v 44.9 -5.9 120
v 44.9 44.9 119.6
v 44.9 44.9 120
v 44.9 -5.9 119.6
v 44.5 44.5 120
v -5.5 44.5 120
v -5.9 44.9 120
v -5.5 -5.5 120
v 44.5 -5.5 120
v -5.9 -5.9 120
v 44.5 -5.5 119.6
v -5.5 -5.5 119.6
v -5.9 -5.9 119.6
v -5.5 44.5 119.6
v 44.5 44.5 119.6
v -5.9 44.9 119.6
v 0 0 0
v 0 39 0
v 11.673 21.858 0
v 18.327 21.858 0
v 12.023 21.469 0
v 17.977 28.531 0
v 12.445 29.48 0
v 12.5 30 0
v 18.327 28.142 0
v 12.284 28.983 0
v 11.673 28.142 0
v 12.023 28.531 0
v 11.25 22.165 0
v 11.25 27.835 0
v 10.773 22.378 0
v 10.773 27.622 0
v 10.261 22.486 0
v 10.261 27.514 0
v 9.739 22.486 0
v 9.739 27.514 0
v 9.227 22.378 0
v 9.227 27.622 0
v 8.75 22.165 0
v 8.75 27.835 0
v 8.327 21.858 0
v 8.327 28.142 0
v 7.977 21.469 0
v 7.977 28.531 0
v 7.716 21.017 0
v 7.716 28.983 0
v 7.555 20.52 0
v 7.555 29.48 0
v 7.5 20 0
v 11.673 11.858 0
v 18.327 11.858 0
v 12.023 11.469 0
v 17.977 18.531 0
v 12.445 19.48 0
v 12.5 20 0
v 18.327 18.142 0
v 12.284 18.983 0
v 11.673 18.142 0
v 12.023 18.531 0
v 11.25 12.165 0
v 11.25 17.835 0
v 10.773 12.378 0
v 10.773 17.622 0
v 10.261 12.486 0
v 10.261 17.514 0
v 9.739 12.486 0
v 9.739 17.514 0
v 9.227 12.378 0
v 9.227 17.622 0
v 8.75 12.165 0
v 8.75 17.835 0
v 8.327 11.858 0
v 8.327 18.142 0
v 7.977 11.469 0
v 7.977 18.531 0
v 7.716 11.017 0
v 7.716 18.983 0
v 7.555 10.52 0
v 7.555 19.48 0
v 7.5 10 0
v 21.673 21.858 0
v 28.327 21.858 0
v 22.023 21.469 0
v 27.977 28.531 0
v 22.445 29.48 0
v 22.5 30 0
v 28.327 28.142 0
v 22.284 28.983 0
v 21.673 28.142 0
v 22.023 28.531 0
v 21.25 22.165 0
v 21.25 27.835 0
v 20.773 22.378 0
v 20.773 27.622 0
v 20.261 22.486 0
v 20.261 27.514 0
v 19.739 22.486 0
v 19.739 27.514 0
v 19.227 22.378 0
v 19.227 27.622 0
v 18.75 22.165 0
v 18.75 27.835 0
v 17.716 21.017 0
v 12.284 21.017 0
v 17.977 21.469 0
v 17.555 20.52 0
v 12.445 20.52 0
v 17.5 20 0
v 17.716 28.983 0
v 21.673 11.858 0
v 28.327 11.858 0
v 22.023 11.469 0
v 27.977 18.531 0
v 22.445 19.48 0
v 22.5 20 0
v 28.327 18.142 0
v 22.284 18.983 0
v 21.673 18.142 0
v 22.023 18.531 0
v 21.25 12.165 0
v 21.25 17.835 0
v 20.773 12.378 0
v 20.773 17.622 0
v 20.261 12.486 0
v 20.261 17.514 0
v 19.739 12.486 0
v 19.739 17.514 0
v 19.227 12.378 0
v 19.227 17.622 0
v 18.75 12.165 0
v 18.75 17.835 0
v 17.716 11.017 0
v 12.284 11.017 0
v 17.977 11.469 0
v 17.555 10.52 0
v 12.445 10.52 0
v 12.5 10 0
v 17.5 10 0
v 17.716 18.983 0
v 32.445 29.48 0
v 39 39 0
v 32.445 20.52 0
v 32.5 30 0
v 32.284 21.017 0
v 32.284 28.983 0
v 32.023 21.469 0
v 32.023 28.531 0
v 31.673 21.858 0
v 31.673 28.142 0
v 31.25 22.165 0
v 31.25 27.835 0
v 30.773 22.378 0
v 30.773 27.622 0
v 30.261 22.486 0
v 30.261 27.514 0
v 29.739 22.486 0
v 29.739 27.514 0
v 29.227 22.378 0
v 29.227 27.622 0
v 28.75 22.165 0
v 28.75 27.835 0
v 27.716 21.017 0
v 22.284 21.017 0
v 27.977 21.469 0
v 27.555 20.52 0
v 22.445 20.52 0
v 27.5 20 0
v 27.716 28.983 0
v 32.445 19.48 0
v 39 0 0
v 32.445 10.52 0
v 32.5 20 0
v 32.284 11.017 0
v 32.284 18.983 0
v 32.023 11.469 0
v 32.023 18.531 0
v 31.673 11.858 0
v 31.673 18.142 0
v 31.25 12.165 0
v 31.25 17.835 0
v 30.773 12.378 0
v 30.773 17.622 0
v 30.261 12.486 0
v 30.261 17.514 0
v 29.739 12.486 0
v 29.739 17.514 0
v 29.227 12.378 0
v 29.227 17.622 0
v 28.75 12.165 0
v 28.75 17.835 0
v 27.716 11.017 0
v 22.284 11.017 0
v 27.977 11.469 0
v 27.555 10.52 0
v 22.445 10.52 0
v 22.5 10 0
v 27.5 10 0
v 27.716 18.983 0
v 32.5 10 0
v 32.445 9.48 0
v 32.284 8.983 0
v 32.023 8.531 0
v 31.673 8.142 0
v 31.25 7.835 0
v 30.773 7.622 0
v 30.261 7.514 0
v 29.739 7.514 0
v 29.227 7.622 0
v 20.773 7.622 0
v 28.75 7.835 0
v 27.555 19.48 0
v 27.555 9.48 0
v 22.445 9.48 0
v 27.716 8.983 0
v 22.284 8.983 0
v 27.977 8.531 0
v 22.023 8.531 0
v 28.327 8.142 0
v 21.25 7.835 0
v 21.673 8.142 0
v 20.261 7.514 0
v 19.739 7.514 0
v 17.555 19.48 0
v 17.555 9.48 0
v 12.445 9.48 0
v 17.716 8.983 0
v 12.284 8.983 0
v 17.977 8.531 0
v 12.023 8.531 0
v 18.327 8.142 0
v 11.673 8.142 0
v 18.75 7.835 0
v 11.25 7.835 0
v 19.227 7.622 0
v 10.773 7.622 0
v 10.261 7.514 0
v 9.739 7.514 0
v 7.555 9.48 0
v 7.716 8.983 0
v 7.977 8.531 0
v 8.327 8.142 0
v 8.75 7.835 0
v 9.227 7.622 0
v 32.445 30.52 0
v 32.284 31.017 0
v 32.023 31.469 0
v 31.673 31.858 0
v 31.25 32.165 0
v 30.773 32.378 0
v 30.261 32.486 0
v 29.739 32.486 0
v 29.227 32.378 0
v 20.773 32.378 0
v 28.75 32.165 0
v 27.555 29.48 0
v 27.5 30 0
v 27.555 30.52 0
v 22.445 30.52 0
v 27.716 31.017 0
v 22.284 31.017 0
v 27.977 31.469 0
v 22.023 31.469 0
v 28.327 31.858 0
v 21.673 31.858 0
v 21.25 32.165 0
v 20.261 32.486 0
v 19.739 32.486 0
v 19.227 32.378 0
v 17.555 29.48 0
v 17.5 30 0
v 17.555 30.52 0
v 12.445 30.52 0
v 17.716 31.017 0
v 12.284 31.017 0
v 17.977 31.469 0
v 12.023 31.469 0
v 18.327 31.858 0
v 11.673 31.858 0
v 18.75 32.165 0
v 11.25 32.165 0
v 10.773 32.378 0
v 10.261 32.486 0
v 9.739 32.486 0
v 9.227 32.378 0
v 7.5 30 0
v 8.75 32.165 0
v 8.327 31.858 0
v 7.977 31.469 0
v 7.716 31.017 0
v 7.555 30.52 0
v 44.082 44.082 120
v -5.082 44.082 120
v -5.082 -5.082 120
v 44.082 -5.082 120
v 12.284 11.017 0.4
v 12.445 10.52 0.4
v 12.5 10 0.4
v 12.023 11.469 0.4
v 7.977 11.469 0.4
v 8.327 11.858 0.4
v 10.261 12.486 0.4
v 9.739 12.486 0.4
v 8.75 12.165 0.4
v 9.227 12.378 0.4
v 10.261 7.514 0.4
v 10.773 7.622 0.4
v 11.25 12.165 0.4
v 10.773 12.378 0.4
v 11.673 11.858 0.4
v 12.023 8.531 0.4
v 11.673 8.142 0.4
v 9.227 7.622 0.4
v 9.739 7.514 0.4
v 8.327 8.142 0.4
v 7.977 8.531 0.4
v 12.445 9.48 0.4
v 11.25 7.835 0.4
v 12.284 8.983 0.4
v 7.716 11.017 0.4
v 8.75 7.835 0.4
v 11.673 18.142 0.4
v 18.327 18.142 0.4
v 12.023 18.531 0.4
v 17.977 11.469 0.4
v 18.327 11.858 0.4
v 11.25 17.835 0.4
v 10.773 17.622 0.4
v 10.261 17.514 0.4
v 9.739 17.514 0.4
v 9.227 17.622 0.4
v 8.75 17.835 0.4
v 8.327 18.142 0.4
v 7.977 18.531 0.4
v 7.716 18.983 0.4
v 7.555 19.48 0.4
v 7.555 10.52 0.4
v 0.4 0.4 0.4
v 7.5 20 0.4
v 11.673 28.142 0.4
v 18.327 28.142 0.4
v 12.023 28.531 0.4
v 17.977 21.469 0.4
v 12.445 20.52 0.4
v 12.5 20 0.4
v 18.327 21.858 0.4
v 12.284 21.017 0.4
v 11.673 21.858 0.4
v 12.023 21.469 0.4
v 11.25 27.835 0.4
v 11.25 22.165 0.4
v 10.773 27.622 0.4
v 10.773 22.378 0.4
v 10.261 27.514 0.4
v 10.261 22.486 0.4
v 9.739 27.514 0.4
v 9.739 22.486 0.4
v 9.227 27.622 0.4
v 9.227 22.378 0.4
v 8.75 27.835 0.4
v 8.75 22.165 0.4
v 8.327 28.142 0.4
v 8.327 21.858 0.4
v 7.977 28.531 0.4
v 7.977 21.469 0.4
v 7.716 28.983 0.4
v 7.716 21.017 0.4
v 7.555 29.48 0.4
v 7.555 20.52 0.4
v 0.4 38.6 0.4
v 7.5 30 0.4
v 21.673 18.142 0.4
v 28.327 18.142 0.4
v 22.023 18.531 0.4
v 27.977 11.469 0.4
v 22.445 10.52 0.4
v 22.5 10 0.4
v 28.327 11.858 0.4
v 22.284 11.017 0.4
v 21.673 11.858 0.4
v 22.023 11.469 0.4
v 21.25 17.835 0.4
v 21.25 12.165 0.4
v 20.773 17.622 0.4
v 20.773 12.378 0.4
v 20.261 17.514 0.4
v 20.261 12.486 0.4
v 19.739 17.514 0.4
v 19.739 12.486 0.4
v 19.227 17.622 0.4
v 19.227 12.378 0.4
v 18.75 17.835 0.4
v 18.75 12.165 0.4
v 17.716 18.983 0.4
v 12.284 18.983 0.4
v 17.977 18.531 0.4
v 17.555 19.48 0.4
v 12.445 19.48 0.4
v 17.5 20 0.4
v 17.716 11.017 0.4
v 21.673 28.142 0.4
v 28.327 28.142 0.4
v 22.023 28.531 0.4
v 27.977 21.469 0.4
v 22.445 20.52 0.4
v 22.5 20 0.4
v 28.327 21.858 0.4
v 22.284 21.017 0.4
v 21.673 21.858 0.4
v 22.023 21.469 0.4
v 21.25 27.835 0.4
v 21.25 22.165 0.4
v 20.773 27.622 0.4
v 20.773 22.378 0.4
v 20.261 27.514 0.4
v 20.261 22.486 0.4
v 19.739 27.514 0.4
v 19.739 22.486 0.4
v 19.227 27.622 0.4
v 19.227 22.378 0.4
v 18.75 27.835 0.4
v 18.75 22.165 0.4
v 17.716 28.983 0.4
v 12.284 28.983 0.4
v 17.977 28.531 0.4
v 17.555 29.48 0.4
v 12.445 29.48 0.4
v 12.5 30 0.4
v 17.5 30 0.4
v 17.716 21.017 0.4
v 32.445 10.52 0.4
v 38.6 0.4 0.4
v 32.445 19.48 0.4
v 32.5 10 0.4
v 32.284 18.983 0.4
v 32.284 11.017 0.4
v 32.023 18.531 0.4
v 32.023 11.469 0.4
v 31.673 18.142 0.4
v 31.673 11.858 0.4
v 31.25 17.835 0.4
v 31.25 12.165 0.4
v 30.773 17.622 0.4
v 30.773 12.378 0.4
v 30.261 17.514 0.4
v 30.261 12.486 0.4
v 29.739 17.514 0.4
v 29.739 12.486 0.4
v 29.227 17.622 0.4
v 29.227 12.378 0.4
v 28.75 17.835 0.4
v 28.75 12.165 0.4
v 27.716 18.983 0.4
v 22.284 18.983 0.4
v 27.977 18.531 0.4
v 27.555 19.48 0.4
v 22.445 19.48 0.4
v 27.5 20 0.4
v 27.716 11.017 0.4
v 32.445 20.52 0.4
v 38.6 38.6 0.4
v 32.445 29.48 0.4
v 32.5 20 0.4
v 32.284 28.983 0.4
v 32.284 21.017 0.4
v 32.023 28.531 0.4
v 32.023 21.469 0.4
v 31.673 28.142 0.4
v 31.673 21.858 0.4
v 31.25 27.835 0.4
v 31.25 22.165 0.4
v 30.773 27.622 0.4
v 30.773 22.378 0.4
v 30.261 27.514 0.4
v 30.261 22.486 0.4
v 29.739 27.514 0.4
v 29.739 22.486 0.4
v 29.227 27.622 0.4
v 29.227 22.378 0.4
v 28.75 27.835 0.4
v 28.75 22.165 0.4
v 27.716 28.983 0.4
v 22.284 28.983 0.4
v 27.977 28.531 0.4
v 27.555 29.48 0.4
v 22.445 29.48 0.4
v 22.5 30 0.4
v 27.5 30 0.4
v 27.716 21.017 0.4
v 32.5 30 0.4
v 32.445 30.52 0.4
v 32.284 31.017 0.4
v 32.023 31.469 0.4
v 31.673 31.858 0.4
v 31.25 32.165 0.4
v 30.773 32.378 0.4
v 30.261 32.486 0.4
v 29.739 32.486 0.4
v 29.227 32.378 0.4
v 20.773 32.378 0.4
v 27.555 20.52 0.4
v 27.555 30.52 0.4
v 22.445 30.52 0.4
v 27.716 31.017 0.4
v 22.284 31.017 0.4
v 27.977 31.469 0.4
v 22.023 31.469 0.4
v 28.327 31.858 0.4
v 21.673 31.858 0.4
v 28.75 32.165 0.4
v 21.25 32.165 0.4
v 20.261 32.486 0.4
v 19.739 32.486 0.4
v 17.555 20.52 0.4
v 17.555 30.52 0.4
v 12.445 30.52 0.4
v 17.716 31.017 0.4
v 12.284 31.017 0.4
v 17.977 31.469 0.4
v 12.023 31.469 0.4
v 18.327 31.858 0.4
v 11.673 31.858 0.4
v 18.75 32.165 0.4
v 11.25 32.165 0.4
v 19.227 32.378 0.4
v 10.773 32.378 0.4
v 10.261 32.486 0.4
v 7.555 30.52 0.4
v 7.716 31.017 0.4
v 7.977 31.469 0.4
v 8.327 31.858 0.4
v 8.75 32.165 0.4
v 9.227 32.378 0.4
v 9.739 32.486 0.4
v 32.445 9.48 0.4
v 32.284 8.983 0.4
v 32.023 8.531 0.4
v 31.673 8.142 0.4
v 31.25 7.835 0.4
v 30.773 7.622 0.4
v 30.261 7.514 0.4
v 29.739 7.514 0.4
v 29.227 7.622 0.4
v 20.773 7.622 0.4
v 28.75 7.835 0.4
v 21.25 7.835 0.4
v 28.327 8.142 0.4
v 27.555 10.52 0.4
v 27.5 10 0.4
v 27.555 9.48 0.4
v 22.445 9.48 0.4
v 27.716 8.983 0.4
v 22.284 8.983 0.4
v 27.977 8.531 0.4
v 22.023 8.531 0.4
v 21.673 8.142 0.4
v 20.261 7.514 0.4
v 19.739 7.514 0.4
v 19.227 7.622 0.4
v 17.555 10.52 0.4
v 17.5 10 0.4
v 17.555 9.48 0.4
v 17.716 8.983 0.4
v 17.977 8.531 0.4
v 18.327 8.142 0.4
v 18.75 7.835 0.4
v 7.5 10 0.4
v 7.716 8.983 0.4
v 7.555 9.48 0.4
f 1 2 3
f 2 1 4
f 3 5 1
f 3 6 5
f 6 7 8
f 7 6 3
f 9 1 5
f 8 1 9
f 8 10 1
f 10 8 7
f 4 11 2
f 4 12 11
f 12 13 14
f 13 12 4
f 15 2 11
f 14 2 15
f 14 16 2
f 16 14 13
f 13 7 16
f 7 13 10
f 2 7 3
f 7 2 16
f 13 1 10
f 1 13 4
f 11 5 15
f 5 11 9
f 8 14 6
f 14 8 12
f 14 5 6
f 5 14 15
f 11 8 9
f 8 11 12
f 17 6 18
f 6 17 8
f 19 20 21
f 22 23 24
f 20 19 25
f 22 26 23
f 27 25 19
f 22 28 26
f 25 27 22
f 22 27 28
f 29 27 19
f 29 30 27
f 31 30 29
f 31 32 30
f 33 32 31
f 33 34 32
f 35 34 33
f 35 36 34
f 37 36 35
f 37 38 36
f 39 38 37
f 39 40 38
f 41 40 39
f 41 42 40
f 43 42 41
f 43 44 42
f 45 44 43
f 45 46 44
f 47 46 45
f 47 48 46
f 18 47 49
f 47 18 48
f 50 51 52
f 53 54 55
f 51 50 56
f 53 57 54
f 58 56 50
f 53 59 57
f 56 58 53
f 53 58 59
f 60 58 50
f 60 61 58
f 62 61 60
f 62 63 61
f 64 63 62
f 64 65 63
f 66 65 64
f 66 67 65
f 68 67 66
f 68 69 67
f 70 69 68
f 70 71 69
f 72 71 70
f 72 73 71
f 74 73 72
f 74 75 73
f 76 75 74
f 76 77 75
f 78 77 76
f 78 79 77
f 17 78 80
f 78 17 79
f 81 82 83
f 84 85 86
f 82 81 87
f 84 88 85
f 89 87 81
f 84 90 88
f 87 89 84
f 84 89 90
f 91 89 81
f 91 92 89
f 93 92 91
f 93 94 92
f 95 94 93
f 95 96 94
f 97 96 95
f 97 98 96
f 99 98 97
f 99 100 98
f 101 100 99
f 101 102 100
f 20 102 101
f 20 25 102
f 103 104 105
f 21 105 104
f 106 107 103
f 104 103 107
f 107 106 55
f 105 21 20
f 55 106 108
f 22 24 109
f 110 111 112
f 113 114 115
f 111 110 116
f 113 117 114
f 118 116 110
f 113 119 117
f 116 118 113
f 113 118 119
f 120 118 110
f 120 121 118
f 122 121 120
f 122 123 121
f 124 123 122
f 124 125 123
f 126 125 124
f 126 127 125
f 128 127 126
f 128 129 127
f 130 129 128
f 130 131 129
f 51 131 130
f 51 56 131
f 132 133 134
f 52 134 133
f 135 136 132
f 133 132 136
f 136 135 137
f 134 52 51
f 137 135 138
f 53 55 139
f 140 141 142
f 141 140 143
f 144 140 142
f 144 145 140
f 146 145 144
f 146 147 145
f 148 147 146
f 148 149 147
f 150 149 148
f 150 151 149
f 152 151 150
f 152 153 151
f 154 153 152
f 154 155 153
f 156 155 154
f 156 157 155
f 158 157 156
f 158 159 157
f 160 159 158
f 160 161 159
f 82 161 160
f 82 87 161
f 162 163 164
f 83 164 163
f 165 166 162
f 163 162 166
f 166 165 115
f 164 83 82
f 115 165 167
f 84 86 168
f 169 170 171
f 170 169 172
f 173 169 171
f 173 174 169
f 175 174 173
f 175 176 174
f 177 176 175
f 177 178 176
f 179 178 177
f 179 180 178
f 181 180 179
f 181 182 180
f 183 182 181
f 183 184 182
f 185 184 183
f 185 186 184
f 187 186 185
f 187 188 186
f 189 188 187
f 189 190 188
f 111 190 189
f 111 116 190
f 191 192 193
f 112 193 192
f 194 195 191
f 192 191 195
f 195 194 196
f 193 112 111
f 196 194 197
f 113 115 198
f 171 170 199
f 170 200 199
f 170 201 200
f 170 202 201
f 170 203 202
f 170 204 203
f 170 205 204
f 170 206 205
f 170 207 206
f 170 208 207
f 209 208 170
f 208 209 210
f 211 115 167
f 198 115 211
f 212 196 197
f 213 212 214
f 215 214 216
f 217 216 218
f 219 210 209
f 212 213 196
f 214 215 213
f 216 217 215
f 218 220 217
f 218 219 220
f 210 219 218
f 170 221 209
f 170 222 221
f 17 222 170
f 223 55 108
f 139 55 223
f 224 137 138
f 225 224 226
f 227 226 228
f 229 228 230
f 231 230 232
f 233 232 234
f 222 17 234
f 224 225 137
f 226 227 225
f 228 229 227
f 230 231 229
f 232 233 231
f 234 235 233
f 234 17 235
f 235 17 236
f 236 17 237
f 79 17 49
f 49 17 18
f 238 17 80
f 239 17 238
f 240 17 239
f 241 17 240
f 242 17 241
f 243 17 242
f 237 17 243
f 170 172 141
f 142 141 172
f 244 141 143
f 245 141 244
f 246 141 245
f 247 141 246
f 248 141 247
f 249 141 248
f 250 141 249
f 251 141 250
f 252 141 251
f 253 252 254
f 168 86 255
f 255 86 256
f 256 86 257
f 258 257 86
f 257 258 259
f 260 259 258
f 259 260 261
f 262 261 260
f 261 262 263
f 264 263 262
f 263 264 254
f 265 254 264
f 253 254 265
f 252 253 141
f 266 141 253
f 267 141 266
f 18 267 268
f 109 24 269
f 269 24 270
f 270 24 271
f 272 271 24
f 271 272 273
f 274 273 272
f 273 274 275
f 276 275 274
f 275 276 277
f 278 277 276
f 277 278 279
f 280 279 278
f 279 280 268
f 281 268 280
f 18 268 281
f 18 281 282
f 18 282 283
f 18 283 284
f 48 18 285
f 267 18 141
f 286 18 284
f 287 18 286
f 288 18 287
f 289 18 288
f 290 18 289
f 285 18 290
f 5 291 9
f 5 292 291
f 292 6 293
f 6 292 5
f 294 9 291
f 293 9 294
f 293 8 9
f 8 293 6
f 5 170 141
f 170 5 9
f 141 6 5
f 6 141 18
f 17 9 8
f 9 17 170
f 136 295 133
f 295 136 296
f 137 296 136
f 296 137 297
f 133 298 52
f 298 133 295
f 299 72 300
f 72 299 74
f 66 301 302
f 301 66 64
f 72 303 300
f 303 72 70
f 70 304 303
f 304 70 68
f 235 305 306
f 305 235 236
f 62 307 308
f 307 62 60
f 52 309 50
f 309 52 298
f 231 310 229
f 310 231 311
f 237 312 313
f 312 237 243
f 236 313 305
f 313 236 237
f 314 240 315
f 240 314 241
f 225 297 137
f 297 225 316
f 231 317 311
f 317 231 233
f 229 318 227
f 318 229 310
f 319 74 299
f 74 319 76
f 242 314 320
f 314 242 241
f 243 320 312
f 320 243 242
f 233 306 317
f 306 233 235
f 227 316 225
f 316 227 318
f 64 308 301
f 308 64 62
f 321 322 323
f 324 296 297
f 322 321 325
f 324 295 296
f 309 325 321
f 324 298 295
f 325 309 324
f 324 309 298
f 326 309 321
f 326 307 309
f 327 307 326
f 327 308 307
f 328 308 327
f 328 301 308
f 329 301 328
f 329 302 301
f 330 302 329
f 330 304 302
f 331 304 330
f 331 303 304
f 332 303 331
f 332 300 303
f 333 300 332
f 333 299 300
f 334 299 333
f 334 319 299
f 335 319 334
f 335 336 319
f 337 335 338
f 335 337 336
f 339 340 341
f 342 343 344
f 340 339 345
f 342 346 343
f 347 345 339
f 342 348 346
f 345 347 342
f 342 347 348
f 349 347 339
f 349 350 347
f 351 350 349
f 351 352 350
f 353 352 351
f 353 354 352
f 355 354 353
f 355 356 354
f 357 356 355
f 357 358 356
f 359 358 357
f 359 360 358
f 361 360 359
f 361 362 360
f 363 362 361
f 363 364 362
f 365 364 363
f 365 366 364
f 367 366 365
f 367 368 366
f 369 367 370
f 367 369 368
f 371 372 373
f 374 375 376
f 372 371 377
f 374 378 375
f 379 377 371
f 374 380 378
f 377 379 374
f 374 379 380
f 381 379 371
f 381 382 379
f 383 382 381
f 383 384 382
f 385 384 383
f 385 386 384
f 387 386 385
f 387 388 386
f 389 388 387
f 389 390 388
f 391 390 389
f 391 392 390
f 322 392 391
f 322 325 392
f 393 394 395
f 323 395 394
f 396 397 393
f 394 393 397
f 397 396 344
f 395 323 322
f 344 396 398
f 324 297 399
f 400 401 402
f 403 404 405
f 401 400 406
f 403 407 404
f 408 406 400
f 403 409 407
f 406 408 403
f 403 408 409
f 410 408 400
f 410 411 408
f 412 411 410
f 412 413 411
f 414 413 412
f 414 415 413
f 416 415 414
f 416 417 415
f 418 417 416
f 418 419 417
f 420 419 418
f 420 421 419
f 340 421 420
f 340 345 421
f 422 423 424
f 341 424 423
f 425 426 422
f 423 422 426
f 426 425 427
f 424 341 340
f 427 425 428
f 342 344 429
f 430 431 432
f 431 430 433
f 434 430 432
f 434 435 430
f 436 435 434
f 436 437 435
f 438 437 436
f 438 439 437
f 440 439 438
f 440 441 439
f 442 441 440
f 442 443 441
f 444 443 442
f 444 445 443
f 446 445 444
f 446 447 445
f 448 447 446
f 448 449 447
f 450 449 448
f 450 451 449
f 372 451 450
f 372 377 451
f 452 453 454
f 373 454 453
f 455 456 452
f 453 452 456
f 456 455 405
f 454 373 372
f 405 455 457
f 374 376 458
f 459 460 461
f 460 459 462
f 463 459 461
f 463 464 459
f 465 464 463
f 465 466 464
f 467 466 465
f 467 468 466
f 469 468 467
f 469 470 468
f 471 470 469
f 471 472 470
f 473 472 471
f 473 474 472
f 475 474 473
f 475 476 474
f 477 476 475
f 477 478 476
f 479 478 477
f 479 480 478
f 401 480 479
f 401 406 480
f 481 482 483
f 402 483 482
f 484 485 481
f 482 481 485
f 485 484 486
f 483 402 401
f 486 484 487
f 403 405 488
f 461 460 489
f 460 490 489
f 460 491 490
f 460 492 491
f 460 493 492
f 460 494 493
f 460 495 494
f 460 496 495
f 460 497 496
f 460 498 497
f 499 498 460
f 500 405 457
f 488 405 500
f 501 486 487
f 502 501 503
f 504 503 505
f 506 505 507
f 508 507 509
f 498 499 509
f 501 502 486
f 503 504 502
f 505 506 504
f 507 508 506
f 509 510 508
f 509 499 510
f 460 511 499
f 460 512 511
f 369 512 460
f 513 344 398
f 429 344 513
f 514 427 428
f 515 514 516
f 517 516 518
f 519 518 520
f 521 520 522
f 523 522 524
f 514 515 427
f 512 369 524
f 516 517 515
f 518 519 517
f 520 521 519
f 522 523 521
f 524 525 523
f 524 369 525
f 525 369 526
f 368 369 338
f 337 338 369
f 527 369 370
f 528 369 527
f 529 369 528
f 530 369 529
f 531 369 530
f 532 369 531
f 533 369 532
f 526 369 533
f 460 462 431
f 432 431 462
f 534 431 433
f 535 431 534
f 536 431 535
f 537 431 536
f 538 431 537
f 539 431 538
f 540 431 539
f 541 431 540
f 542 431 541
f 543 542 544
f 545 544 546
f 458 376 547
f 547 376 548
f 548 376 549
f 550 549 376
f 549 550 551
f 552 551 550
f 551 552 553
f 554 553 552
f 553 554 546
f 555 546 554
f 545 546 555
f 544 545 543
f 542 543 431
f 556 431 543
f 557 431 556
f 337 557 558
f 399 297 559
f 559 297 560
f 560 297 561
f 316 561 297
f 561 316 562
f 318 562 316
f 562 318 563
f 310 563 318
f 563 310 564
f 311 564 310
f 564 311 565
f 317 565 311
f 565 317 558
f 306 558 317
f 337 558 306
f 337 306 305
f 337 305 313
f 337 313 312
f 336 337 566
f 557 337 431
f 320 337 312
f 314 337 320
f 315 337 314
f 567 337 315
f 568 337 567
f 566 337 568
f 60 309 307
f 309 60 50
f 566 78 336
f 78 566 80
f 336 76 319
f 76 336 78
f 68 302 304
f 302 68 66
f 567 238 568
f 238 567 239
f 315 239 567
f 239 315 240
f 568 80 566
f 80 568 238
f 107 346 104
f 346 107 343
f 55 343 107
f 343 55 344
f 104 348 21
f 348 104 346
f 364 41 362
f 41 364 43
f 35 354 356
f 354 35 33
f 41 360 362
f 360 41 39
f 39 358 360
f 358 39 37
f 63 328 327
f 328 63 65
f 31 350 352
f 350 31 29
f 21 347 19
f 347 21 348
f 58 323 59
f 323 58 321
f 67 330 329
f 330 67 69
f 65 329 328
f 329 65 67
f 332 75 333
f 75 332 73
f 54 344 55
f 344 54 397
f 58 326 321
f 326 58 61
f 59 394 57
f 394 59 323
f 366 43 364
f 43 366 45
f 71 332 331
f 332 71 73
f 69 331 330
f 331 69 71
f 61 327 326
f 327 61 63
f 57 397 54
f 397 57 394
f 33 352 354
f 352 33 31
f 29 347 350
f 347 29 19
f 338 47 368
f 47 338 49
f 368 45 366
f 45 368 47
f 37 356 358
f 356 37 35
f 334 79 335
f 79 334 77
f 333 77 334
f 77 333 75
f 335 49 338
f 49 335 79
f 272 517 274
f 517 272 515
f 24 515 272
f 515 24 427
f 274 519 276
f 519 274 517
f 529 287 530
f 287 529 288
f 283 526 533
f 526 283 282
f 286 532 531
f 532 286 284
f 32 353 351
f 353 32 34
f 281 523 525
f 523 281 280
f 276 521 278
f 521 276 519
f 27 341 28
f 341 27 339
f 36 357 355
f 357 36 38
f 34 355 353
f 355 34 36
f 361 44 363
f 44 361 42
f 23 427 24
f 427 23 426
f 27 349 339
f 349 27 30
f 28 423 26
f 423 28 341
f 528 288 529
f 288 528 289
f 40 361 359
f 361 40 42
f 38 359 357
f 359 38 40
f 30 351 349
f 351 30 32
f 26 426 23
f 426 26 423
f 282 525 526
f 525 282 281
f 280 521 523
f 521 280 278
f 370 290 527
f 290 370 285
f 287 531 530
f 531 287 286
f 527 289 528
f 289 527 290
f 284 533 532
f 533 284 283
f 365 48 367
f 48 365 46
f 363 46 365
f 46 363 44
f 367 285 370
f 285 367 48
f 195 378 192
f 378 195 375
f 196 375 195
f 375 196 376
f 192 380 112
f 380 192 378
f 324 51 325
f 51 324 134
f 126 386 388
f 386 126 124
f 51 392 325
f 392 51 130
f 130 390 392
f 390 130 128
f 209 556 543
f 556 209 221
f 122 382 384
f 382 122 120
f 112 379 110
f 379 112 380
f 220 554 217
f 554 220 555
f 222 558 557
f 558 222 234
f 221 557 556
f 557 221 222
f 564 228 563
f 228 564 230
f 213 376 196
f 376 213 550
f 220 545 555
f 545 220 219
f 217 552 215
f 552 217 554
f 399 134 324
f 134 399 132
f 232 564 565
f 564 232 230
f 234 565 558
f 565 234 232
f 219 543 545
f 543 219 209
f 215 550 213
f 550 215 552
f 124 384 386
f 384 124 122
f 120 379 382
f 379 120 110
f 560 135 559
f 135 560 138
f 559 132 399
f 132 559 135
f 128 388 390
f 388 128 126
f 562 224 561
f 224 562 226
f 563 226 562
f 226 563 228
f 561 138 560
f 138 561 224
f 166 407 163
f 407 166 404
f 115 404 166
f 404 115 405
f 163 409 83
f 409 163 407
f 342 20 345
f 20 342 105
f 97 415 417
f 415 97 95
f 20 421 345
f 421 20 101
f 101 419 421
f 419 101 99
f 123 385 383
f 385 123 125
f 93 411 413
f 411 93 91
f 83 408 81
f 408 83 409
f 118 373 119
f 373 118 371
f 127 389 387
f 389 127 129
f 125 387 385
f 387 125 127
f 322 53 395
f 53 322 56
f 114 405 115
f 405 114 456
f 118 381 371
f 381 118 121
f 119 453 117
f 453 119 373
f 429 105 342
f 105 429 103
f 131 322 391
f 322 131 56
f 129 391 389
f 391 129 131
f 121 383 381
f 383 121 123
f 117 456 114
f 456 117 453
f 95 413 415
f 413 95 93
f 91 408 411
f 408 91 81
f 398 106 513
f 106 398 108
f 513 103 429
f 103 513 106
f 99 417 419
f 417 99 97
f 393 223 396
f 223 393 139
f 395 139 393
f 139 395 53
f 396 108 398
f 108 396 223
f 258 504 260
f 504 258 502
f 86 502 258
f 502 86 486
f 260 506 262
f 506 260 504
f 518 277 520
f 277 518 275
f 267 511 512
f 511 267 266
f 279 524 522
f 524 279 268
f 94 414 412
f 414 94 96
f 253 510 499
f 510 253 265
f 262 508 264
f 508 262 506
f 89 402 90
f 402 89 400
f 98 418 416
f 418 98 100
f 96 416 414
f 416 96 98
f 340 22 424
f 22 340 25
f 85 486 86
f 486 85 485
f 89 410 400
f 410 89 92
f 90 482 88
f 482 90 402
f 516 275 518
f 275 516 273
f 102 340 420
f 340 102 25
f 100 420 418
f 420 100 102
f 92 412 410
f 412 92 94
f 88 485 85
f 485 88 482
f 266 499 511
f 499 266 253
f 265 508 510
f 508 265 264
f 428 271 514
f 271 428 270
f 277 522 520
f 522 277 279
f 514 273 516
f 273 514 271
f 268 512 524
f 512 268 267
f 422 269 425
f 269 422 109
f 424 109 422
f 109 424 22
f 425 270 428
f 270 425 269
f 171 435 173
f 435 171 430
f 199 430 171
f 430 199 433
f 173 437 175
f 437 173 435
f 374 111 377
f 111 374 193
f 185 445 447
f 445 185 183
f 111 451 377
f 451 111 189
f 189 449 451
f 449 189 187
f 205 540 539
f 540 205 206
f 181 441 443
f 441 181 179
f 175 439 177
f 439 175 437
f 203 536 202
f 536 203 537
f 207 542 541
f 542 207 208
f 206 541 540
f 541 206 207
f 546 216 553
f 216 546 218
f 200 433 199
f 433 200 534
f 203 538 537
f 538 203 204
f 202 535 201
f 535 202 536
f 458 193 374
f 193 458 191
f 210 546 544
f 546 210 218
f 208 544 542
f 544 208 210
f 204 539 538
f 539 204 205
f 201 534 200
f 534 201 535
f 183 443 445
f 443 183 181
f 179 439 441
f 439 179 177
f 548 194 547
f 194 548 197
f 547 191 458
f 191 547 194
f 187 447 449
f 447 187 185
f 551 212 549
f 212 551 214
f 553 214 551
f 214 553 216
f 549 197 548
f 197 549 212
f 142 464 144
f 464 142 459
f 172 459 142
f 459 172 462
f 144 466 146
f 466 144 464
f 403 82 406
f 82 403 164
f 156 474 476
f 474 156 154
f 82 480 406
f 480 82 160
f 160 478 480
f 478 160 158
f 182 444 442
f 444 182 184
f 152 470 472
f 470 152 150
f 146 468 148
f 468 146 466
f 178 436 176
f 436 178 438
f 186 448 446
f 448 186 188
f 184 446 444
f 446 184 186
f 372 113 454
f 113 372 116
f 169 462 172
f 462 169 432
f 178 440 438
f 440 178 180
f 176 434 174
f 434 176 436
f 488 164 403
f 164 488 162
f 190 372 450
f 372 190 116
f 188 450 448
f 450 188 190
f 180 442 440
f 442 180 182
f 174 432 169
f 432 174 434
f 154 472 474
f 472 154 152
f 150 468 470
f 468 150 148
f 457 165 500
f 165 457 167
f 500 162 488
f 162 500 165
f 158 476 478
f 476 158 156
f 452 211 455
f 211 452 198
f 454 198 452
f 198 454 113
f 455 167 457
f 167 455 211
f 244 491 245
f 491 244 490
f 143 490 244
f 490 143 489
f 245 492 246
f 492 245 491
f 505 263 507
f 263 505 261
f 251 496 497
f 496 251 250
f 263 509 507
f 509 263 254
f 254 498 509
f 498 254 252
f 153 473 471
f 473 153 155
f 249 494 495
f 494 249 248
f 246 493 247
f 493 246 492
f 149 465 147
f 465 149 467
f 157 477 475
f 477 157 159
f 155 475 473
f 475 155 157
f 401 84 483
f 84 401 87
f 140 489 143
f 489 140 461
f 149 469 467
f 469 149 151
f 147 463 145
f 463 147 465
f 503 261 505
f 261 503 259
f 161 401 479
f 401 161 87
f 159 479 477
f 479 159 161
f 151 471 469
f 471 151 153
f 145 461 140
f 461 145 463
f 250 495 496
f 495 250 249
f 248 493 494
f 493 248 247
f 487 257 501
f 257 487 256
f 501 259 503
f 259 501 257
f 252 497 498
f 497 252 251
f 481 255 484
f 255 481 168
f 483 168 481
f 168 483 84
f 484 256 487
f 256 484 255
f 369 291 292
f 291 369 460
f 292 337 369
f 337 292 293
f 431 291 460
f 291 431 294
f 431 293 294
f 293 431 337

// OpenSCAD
/* [Top and bottom dimensions (set to same value for no taper)] */

TOP_DIMENSION = 50; // in mm

BOTTOM_DIMENSION = 39; // in mm

/* [Total height] */

HEIGHT = 120; // in mm

/* [Wall thickness] */

WALL_THICKNESS = 0.4; // in mm

/* [Drainage holes] */

HOLE_DIAMETER = 5; // in mm

HOLE_SPACING = 10; // in mm

/* [Lip dimension (set to zero to disable)] */

LIP_DIMENSION = 0.4; // in mm

/* [Internal variables (do not touch)] */

EPSILON = 0.00001; // in mm

module tapered_cube(top_xy, bottom_xy, height) {
    translate([bottom_xy / 2, bottom_xy / 2, 0]) {
        linear_extrude(height=height, scale=top_xy / bottom_xy) square(bottom_xy, center=true);
    };
};

module lip() {
    translate([BOTTOM_DIMENSION / 2, BOTTOM_DIMENSION / 2, HEIGHT - LIP_DIMENSION / 2]) {
        difference(){
            cube([TOP_DIMENSION + 2 * LIP_DIMENSION, TOP_DIMENSION + 2 * LIP_DIMENSION, LIP_DIMENSION], center=true);
            cube([TOP_DIMENSION, TOP_DIMENSION, LIP_DIMENSION], center=true);
        };
    };    
}

difference() {
    color([1, 0, 0, 0.5]) union() {
        tapered_cube(TOP_DIMENSION, BOTTOM_DIMENSION, HEIGHT);
        // Lip
        lip();
    };
    color([0, 1, 0, 0.5]) union() {
        translate([WALL_THICKNESS, WALL_THICKNESS, WALL_THICKNESS]) {
            tapered_cube(TOP_DIMENSION - 2 * WALL_THICKNESS, BOTTOM_DIMENSION - 2 * WALL_THICKNESS, HEIGHT);
        };
        union() {
            for (i = [1:floor((BOTTOM_DIMENSION - EPSILON)/ HOLE_SPACING)])
                for (j = [1:floor((BOTTOM_DIMENSION - EPSILON)/ HOLE_SPACING)])
                    translate([i * HOLE_SPACING, j * HOLE_SPACING, 0])
                        cylinder(d=HOLE_DIAMETER, h=WALL_THICKNESS, $fs=0.5);
        };
    };
};
